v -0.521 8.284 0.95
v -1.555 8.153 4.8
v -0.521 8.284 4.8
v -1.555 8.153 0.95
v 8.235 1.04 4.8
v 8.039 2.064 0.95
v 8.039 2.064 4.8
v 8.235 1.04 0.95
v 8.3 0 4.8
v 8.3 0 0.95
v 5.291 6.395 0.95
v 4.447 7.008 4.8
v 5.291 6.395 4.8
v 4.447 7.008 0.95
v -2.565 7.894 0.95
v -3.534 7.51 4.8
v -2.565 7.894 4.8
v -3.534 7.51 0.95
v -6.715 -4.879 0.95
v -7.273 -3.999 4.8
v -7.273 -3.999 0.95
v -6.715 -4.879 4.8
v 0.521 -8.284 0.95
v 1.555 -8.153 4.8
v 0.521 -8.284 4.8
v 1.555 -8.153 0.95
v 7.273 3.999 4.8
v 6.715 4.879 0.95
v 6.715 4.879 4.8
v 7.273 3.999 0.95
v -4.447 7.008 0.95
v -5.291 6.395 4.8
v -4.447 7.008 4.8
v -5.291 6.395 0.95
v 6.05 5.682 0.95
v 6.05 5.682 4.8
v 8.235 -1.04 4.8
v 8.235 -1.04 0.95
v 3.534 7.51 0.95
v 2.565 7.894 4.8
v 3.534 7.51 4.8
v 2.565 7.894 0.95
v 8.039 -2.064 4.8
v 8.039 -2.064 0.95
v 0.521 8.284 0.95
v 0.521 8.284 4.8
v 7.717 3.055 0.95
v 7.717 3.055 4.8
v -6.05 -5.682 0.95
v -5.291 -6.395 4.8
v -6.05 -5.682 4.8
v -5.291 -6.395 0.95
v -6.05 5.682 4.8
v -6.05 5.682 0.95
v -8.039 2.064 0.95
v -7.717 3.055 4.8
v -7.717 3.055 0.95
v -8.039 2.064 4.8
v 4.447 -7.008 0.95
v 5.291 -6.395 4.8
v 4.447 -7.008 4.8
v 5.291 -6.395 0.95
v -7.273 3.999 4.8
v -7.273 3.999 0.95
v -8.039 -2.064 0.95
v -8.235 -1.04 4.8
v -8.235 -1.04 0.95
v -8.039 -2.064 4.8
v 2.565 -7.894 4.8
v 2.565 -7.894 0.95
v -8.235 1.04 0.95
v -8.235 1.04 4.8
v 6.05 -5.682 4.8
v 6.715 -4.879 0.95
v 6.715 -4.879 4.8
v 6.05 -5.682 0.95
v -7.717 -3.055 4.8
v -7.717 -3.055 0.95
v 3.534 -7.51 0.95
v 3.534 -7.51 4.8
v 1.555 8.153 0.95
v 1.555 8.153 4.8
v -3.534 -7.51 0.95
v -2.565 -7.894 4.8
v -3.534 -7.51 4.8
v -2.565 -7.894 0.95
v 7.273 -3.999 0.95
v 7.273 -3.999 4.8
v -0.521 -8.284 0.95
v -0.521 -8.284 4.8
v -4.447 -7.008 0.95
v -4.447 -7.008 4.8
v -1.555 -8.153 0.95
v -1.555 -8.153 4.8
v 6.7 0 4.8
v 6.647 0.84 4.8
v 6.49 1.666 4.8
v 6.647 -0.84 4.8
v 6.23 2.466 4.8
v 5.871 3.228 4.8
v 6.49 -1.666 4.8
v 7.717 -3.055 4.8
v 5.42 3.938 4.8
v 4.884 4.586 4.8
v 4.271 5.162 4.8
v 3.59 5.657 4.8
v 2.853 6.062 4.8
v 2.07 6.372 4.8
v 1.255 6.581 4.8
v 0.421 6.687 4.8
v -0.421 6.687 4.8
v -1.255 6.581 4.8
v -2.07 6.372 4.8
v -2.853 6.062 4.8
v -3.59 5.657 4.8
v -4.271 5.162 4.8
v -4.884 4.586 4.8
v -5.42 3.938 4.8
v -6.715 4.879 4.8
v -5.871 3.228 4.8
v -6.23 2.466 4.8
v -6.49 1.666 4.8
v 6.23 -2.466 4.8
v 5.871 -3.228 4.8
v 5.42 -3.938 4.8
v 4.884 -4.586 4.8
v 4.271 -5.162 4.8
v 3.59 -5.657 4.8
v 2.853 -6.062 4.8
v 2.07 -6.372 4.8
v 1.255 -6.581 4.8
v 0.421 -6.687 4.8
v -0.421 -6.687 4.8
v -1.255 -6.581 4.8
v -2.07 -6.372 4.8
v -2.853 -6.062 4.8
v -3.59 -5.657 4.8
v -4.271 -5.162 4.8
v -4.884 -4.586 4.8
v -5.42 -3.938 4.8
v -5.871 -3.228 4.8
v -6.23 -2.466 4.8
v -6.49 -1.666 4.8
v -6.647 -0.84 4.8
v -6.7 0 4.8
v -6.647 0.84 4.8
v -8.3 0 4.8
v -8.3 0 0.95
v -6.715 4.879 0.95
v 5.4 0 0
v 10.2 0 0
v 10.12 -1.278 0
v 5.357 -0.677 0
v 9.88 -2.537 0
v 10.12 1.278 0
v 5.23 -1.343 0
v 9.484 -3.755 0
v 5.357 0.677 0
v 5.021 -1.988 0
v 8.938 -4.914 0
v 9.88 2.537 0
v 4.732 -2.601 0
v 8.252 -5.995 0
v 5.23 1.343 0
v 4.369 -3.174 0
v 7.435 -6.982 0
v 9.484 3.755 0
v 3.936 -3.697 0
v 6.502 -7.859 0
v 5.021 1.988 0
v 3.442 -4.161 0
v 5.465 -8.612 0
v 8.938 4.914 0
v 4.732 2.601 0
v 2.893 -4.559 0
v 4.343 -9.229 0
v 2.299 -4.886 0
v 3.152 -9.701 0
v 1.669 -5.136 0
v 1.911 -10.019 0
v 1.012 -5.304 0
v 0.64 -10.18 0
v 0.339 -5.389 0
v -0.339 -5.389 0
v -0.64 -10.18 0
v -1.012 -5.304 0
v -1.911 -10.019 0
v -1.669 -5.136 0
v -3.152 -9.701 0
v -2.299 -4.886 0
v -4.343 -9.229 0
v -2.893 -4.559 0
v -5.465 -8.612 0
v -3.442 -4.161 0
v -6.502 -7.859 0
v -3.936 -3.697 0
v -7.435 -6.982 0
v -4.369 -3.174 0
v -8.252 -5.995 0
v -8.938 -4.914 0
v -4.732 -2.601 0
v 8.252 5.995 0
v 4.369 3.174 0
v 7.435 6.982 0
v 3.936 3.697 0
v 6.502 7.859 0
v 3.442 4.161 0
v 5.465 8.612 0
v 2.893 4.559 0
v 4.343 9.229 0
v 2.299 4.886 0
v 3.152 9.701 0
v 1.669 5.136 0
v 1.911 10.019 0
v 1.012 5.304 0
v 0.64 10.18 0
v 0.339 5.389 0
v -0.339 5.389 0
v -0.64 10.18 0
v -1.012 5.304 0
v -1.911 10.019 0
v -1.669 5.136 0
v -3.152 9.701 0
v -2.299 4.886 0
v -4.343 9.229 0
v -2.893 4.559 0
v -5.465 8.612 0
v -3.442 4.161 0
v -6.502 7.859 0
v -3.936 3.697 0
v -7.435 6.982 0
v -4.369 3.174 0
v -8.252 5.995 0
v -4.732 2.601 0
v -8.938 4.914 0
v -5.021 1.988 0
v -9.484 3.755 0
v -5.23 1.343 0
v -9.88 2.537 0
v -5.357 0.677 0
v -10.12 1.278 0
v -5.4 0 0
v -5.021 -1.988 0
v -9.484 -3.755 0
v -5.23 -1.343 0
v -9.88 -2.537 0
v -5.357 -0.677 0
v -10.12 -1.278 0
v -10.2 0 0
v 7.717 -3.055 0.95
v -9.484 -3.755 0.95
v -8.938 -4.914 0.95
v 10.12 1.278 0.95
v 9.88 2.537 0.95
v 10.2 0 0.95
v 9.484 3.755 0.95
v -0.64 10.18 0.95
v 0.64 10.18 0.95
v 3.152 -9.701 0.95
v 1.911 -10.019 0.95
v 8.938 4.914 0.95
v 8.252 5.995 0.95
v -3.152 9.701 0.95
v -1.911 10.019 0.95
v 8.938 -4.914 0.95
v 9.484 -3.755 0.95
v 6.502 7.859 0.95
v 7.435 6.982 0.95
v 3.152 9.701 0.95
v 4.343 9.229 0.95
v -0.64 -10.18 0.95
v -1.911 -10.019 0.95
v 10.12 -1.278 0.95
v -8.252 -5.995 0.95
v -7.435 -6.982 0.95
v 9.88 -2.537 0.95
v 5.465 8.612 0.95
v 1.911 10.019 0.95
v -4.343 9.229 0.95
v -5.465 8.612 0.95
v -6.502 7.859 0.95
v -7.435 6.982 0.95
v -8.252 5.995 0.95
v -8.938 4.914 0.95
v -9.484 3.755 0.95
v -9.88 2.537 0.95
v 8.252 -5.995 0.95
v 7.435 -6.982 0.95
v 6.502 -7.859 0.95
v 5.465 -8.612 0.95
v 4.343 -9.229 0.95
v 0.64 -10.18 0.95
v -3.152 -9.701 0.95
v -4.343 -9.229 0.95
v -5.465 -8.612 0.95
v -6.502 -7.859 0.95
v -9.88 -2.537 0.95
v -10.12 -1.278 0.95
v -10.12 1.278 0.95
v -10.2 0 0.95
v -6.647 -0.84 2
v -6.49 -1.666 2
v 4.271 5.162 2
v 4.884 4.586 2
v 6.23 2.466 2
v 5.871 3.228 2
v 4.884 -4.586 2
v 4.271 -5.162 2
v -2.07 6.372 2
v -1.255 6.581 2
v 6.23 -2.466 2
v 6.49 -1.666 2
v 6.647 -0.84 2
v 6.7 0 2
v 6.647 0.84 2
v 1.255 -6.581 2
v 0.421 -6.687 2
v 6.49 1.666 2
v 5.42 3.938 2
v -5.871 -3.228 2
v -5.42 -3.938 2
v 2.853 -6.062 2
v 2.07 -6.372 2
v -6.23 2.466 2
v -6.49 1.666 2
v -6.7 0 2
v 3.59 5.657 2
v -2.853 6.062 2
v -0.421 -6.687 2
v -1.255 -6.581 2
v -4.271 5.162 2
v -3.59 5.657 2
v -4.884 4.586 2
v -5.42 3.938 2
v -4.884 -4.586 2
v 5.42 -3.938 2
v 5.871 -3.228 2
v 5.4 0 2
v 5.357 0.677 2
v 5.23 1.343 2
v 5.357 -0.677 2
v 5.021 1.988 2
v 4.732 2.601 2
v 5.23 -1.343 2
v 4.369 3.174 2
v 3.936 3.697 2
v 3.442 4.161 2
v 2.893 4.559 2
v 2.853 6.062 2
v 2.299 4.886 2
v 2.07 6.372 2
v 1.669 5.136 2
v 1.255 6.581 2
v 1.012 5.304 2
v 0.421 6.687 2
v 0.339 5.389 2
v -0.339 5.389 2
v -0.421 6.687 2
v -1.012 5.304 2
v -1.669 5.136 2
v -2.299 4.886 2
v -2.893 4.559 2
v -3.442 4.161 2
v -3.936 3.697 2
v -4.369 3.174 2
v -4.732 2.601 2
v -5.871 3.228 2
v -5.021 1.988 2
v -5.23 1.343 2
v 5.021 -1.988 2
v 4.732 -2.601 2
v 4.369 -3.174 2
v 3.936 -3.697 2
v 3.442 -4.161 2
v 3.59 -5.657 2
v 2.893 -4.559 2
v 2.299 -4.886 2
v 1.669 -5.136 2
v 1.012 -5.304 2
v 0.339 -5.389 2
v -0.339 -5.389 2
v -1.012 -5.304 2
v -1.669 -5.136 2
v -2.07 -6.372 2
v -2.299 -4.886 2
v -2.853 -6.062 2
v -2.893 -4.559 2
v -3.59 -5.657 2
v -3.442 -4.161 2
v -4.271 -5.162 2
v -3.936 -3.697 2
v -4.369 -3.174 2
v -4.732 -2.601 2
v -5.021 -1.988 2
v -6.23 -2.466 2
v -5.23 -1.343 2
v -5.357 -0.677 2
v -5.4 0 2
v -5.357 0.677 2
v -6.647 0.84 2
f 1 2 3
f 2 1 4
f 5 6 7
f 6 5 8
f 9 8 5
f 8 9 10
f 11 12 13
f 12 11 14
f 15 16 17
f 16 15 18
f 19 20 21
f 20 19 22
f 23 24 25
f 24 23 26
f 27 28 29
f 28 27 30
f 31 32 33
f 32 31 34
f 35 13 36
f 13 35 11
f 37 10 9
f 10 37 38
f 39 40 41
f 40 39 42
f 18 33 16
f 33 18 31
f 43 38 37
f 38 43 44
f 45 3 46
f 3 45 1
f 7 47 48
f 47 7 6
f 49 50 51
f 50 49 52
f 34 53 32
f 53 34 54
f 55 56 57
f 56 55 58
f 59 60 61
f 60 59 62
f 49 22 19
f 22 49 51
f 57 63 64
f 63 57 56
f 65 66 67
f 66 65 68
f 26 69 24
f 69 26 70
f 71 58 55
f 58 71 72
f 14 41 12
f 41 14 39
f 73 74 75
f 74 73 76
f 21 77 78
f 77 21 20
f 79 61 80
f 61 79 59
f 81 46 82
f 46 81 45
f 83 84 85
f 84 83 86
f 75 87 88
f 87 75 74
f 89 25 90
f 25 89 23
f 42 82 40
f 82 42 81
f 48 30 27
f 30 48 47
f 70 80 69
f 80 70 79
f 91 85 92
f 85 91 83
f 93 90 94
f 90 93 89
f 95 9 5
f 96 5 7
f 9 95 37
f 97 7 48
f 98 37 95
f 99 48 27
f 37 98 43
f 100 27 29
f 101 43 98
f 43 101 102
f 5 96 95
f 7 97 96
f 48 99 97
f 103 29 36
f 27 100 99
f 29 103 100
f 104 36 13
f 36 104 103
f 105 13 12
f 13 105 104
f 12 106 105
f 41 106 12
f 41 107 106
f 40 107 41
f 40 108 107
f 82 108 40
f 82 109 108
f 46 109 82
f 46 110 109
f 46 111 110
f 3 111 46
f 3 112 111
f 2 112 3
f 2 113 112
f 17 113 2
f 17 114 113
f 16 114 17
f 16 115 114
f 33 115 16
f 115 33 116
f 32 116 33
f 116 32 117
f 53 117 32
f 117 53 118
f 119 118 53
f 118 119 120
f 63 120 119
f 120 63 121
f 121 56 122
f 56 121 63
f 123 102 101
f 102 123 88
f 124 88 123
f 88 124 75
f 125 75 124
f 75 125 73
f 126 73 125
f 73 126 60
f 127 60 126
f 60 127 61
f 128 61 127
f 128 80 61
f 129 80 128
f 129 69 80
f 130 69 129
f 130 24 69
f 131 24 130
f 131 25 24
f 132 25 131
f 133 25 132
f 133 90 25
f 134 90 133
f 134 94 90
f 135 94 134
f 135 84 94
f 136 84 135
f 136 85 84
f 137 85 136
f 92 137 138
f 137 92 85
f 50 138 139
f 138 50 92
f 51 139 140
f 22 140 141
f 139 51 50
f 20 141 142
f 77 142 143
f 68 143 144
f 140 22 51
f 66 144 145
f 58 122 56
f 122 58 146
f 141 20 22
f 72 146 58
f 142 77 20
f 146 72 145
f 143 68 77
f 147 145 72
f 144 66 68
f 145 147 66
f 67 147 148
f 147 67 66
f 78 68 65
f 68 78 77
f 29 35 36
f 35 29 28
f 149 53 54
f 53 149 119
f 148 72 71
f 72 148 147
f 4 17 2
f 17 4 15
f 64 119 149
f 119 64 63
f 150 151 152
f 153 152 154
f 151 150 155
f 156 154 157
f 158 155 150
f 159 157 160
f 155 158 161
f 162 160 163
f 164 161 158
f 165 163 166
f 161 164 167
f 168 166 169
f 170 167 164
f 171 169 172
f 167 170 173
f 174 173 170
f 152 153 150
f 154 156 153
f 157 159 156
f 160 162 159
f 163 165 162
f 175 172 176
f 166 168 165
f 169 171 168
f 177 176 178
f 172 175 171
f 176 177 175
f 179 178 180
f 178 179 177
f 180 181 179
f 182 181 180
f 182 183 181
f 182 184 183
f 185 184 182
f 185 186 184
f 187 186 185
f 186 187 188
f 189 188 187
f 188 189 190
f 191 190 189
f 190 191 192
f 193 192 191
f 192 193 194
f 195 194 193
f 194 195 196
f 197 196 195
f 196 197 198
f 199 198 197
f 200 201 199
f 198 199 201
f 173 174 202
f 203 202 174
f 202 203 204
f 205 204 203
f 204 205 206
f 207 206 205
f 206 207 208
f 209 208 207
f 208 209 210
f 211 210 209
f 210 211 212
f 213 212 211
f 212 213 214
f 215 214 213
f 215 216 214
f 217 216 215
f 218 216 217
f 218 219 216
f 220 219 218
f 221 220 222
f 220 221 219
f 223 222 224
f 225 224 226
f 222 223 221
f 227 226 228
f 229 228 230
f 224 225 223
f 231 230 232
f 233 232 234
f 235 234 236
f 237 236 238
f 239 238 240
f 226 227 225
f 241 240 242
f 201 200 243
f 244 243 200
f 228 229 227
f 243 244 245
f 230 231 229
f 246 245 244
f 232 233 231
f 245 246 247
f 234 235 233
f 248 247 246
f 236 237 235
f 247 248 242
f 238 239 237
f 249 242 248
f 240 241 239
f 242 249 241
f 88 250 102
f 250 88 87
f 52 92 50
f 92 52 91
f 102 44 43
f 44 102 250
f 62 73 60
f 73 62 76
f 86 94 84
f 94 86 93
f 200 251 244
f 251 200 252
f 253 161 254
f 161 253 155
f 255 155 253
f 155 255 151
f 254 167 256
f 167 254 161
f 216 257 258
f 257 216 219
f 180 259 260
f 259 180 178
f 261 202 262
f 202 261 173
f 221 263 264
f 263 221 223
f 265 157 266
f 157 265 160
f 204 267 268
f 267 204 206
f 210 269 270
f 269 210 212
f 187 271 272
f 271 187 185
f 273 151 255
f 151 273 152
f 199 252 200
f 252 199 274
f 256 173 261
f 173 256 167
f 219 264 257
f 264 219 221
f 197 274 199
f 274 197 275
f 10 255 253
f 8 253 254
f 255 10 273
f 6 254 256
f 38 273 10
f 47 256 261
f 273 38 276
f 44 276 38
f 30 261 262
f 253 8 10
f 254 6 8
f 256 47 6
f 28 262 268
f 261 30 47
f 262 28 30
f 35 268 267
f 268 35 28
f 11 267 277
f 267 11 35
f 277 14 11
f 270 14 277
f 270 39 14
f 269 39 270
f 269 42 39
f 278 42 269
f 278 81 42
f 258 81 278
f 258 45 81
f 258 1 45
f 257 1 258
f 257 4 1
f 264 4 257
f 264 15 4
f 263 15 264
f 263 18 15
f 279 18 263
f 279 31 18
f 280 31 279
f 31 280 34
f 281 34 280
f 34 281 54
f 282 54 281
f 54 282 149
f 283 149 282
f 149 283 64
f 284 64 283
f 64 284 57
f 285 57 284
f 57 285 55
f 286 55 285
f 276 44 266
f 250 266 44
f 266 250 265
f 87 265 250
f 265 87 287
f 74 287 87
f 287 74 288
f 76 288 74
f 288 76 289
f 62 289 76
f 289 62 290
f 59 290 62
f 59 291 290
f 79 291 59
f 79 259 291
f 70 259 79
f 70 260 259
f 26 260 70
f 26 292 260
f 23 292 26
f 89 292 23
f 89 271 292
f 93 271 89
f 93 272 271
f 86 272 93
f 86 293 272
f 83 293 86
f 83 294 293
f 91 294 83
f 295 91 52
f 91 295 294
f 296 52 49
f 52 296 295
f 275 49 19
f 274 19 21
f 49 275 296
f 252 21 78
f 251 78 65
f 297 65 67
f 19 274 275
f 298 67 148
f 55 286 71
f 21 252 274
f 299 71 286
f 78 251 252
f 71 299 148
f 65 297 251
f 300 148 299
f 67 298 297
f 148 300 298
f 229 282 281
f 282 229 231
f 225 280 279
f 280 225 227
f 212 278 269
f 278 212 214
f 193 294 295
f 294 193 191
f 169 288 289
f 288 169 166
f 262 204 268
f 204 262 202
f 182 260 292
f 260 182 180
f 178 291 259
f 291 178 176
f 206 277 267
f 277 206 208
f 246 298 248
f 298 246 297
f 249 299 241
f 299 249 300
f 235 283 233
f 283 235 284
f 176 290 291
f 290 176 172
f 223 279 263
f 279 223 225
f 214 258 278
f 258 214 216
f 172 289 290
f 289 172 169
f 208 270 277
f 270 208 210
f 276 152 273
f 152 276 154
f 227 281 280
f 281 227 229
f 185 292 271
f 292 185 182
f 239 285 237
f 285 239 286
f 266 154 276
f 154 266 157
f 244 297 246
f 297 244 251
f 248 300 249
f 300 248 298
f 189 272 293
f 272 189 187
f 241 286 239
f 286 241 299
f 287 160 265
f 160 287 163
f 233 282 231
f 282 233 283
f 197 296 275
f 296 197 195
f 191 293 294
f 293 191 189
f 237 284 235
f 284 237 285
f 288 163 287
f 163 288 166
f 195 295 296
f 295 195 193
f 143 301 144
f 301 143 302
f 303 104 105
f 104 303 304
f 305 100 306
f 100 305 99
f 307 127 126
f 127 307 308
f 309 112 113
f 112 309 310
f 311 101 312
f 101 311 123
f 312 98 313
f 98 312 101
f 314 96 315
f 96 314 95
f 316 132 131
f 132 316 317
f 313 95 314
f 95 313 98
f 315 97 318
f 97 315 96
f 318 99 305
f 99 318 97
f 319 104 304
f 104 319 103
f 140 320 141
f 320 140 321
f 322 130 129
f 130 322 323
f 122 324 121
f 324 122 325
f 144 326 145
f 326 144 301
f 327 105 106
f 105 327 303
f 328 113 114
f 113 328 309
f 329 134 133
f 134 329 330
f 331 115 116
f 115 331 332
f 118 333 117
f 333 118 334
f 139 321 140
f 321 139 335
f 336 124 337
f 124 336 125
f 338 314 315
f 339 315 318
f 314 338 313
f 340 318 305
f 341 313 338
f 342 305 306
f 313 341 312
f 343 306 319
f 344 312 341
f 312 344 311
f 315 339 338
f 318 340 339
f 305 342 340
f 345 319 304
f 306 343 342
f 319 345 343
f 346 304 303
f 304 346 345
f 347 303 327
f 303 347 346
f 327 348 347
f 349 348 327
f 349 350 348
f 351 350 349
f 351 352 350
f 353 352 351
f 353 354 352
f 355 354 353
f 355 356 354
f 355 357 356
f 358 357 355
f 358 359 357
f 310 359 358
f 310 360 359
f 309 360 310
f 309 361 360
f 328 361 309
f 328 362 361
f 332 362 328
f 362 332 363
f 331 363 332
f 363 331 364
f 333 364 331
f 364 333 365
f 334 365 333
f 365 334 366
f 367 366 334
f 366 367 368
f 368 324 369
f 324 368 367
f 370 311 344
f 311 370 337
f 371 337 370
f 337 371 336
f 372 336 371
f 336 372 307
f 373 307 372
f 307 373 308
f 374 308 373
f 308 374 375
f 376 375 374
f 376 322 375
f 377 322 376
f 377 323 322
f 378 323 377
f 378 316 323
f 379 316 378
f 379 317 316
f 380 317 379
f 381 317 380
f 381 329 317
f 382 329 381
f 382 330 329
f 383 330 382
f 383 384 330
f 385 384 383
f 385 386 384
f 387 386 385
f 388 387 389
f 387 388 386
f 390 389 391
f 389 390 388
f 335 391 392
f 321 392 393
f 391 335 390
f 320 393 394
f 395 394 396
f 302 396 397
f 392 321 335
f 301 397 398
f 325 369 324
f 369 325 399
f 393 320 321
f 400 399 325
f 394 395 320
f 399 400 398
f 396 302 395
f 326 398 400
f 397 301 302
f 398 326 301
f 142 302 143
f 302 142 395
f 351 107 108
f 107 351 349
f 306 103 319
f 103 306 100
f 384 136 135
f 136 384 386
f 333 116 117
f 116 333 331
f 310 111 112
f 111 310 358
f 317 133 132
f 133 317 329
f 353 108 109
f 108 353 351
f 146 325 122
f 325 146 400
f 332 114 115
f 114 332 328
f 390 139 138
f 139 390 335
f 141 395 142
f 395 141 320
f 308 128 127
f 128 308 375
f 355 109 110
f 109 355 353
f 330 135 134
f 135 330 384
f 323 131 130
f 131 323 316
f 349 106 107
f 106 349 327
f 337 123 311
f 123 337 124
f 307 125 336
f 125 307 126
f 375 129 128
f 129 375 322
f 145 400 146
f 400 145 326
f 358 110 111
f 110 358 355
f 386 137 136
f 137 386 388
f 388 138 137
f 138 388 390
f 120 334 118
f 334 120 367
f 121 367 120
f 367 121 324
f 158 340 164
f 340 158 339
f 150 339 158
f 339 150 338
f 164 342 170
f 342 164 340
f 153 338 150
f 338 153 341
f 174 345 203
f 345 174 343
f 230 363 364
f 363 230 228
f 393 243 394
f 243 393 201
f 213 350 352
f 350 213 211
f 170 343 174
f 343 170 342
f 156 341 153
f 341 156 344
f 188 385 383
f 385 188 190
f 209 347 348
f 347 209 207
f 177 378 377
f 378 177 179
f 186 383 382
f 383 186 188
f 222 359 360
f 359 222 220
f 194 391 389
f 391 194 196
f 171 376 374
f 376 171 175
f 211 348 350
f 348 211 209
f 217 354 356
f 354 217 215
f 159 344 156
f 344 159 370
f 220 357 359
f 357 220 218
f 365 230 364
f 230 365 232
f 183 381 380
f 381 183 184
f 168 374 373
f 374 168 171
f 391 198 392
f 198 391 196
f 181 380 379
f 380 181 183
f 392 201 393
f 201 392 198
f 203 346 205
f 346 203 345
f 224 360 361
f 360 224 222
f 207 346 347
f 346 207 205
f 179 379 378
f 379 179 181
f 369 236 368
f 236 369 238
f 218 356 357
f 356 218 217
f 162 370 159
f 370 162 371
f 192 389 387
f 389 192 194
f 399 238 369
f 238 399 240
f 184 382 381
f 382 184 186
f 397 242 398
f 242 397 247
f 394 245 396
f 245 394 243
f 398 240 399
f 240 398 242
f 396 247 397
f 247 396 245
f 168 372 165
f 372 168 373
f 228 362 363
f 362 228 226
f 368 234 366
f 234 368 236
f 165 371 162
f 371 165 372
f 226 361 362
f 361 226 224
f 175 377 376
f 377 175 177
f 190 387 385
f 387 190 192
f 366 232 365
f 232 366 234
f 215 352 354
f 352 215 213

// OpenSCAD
wall= 1.2;
clearence= 0.1; 

module belt_guide_base(){
 cylinder(r=7+wall+clearence, h=5-0.2, $fn=50);
 cylinder(r=6.5+wall+clearence+2*wall, h=0.95, $fn=50);
}

module belt_guide_holes(){
 translate([0,0,2]) cylinder(r=6.6+clearence, h=10, $fn=50);
 translate([0,0,-1]) cylinder(r=6.5+wall+clearence-2*wall, h=10, $fn=50);
}

// Final part
module belt_guide(){
 difference(){
  belt_guide_base();
  belt_guide_holes();
 }
}

belt_guide();
